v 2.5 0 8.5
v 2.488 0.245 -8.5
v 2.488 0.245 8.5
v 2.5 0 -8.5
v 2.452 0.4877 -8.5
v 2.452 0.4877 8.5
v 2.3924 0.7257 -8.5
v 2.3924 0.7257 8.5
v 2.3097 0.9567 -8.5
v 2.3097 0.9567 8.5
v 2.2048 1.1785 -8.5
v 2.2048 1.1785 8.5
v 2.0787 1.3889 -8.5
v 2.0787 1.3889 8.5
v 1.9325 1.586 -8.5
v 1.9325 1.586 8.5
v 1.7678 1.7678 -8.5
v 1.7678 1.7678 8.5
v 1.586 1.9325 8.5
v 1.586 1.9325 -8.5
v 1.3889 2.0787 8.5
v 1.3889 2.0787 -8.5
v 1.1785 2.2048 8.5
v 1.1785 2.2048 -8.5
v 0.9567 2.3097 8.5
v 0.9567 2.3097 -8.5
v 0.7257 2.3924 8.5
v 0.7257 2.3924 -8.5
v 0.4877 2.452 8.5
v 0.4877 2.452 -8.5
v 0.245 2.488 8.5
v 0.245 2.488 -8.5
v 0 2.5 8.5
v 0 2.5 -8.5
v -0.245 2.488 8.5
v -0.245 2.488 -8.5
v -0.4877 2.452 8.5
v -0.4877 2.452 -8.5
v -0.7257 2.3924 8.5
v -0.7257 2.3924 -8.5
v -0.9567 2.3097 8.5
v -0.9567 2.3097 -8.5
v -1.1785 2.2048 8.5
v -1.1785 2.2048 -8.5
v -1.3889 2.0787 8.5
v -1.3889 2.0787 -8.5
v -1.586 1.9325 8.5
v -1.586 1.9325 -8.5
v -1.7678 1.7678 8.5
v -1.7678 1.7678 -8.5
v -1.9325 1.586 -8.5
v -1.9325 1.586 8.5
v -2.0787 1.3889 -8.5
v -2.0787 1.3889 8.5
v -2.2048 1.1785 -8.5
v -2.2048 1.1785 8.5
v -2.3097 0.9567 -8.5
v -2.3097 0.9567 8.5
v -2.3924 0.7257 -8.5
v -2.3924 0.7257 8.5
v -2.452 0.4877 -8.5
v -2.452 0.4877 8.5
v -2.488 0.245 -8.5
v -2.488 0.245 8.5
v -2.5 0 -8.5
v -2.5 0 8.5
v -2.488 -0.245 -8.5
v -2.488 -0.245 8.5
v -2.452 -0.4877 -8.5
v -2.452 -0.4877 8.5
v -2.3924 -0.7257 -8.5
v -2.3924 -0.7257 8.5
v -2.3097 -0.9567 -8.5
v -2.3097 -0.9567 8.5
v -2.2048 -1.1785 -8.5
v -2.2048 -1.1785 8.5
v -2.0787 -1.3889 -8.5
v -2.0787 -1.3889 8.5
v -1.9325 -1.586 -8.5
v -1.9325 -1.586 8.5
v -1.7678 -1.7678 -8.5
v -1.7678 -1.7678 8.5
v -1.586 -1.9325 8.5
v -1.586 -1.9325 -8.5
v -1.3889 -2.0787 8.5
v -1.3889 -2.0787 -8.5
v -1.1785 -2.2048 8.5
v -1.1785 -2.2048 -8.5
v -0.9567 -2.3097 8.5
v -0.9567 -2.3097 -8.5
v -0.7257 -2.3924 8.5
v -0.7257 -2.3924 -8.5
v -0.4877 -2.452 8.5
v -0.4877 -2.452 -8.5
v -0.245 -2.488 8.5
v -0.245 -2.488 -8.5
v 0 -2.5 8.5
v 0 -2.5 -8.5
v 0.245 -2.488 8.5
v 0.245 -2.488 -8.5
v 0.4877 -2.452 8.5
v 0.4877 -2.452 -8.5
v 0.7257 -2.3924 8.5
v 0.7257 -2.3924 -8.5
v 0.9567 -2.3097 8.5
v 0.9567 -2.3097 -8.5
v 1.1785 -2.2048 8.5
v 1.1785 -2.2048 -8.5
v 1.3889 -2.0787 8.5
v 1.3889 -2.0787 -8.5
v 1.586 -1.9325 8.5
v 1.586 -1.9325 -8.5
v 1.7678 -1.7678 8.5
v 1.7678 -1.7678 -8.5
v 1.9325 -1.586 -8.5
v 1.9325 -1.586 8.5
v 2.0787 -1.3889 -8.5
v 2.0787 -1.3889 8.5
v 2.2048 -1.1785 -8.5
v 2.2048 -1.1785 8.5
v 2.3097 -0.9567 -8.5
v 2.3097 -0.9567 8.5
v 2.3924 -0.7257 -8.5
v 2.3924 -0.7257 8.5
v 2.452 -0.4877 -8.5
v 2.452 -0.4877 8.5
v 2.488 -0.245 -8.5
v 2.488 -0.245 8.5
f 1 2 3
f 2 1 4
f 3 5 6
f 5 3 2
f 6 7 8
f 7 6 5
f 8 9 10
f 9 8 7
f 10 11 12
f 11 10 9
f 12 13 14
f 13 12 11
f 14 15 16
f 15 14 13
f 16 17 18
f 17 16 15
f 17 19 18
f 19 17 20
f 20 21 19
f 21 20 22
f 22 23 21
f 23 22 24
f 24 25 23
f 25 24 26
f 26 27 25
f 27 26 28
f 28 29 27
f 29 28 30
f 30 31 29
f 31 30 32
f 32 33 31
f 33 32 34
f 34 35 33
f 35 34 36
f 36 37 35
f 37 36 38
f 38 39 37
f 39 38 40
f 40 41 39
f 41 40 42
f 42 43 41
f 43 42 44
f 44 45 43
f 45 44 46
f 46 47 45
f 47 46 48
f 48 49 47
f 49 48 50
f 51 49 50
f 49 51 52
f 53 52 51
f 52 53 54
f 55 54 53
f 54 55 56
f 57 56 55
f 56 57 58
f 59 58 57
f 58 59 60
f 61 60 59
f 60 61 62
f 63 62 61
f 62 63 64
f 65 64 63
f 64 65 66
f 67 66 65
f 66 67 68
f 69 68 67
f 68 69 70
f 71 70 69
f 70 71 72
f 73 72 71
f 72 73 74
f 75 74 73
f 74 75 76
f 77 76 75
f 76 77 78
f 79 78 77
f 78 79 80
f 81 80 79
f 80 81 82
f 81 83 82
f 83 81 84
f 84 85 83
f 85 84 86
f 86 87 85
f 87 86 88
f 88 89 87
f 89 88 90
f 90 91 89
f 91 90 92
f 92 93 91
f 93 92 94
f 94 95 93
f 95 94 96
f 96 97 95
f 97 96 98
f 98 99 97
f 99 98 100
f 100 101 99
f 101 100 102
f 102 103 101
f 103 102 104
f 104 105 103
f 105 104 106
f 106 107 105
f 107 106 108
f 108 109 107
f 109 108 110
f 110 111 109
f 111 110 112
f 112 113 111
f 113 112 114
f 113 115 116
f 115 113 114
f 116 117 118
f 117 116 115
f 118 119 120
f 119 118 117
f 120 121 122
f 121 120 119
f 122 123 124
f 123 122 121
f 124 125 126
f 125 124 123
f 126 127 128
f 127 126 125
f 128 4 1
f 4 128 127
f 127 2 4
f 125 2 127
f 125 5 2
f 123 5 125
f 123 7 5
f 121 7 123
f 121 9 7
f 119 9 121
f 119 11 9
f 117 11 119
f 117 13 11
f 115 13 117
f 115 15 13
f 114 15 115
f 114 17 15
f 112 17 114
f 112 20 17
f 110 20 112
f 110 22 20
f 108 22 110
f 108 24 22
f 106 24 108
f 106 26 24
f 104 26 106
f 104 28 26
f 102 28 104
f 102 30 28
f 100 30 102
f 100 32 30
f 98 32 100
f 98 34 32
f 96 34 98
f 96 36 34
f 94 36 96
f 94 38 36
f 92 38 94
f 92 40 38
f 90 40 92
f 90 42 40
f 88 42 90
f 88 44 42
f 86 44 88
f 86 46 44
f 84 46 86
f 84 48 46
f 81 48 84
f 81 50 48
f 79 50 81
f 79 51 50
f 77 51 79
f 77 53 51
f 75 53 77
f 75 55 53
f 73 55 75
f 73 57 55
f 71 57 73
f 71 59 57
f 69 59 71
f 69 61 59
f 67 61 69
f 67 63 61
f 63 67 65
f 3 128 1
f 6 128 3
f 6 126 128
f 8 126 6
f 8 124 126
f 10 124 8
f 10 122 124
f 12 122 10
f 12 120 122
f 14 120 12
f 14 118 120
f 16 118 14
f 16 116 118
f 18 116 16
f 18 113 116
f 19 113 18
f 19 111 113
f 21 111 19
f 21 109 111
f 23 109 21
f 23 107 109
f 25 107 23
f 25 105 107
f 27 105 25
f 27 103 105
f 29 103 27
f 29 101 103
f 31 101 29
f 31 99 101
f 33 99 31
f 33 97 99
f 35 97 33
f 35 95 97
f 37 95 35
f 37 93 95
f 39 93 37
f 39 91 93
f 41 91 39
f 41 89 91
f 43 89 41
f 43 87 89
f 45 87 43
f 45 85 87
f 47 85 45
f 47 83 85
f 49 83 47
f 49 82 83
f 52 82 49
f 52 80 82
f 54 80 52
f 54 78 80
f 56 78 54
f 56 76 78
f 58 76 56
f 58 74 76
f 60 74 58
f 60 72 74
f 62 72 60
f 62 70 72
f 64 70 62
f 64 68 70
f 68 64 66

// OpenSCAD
$fn = 64;
length = 17;
dia = 5.0;

cylinder(h=length, r=dia/2, center=true);
